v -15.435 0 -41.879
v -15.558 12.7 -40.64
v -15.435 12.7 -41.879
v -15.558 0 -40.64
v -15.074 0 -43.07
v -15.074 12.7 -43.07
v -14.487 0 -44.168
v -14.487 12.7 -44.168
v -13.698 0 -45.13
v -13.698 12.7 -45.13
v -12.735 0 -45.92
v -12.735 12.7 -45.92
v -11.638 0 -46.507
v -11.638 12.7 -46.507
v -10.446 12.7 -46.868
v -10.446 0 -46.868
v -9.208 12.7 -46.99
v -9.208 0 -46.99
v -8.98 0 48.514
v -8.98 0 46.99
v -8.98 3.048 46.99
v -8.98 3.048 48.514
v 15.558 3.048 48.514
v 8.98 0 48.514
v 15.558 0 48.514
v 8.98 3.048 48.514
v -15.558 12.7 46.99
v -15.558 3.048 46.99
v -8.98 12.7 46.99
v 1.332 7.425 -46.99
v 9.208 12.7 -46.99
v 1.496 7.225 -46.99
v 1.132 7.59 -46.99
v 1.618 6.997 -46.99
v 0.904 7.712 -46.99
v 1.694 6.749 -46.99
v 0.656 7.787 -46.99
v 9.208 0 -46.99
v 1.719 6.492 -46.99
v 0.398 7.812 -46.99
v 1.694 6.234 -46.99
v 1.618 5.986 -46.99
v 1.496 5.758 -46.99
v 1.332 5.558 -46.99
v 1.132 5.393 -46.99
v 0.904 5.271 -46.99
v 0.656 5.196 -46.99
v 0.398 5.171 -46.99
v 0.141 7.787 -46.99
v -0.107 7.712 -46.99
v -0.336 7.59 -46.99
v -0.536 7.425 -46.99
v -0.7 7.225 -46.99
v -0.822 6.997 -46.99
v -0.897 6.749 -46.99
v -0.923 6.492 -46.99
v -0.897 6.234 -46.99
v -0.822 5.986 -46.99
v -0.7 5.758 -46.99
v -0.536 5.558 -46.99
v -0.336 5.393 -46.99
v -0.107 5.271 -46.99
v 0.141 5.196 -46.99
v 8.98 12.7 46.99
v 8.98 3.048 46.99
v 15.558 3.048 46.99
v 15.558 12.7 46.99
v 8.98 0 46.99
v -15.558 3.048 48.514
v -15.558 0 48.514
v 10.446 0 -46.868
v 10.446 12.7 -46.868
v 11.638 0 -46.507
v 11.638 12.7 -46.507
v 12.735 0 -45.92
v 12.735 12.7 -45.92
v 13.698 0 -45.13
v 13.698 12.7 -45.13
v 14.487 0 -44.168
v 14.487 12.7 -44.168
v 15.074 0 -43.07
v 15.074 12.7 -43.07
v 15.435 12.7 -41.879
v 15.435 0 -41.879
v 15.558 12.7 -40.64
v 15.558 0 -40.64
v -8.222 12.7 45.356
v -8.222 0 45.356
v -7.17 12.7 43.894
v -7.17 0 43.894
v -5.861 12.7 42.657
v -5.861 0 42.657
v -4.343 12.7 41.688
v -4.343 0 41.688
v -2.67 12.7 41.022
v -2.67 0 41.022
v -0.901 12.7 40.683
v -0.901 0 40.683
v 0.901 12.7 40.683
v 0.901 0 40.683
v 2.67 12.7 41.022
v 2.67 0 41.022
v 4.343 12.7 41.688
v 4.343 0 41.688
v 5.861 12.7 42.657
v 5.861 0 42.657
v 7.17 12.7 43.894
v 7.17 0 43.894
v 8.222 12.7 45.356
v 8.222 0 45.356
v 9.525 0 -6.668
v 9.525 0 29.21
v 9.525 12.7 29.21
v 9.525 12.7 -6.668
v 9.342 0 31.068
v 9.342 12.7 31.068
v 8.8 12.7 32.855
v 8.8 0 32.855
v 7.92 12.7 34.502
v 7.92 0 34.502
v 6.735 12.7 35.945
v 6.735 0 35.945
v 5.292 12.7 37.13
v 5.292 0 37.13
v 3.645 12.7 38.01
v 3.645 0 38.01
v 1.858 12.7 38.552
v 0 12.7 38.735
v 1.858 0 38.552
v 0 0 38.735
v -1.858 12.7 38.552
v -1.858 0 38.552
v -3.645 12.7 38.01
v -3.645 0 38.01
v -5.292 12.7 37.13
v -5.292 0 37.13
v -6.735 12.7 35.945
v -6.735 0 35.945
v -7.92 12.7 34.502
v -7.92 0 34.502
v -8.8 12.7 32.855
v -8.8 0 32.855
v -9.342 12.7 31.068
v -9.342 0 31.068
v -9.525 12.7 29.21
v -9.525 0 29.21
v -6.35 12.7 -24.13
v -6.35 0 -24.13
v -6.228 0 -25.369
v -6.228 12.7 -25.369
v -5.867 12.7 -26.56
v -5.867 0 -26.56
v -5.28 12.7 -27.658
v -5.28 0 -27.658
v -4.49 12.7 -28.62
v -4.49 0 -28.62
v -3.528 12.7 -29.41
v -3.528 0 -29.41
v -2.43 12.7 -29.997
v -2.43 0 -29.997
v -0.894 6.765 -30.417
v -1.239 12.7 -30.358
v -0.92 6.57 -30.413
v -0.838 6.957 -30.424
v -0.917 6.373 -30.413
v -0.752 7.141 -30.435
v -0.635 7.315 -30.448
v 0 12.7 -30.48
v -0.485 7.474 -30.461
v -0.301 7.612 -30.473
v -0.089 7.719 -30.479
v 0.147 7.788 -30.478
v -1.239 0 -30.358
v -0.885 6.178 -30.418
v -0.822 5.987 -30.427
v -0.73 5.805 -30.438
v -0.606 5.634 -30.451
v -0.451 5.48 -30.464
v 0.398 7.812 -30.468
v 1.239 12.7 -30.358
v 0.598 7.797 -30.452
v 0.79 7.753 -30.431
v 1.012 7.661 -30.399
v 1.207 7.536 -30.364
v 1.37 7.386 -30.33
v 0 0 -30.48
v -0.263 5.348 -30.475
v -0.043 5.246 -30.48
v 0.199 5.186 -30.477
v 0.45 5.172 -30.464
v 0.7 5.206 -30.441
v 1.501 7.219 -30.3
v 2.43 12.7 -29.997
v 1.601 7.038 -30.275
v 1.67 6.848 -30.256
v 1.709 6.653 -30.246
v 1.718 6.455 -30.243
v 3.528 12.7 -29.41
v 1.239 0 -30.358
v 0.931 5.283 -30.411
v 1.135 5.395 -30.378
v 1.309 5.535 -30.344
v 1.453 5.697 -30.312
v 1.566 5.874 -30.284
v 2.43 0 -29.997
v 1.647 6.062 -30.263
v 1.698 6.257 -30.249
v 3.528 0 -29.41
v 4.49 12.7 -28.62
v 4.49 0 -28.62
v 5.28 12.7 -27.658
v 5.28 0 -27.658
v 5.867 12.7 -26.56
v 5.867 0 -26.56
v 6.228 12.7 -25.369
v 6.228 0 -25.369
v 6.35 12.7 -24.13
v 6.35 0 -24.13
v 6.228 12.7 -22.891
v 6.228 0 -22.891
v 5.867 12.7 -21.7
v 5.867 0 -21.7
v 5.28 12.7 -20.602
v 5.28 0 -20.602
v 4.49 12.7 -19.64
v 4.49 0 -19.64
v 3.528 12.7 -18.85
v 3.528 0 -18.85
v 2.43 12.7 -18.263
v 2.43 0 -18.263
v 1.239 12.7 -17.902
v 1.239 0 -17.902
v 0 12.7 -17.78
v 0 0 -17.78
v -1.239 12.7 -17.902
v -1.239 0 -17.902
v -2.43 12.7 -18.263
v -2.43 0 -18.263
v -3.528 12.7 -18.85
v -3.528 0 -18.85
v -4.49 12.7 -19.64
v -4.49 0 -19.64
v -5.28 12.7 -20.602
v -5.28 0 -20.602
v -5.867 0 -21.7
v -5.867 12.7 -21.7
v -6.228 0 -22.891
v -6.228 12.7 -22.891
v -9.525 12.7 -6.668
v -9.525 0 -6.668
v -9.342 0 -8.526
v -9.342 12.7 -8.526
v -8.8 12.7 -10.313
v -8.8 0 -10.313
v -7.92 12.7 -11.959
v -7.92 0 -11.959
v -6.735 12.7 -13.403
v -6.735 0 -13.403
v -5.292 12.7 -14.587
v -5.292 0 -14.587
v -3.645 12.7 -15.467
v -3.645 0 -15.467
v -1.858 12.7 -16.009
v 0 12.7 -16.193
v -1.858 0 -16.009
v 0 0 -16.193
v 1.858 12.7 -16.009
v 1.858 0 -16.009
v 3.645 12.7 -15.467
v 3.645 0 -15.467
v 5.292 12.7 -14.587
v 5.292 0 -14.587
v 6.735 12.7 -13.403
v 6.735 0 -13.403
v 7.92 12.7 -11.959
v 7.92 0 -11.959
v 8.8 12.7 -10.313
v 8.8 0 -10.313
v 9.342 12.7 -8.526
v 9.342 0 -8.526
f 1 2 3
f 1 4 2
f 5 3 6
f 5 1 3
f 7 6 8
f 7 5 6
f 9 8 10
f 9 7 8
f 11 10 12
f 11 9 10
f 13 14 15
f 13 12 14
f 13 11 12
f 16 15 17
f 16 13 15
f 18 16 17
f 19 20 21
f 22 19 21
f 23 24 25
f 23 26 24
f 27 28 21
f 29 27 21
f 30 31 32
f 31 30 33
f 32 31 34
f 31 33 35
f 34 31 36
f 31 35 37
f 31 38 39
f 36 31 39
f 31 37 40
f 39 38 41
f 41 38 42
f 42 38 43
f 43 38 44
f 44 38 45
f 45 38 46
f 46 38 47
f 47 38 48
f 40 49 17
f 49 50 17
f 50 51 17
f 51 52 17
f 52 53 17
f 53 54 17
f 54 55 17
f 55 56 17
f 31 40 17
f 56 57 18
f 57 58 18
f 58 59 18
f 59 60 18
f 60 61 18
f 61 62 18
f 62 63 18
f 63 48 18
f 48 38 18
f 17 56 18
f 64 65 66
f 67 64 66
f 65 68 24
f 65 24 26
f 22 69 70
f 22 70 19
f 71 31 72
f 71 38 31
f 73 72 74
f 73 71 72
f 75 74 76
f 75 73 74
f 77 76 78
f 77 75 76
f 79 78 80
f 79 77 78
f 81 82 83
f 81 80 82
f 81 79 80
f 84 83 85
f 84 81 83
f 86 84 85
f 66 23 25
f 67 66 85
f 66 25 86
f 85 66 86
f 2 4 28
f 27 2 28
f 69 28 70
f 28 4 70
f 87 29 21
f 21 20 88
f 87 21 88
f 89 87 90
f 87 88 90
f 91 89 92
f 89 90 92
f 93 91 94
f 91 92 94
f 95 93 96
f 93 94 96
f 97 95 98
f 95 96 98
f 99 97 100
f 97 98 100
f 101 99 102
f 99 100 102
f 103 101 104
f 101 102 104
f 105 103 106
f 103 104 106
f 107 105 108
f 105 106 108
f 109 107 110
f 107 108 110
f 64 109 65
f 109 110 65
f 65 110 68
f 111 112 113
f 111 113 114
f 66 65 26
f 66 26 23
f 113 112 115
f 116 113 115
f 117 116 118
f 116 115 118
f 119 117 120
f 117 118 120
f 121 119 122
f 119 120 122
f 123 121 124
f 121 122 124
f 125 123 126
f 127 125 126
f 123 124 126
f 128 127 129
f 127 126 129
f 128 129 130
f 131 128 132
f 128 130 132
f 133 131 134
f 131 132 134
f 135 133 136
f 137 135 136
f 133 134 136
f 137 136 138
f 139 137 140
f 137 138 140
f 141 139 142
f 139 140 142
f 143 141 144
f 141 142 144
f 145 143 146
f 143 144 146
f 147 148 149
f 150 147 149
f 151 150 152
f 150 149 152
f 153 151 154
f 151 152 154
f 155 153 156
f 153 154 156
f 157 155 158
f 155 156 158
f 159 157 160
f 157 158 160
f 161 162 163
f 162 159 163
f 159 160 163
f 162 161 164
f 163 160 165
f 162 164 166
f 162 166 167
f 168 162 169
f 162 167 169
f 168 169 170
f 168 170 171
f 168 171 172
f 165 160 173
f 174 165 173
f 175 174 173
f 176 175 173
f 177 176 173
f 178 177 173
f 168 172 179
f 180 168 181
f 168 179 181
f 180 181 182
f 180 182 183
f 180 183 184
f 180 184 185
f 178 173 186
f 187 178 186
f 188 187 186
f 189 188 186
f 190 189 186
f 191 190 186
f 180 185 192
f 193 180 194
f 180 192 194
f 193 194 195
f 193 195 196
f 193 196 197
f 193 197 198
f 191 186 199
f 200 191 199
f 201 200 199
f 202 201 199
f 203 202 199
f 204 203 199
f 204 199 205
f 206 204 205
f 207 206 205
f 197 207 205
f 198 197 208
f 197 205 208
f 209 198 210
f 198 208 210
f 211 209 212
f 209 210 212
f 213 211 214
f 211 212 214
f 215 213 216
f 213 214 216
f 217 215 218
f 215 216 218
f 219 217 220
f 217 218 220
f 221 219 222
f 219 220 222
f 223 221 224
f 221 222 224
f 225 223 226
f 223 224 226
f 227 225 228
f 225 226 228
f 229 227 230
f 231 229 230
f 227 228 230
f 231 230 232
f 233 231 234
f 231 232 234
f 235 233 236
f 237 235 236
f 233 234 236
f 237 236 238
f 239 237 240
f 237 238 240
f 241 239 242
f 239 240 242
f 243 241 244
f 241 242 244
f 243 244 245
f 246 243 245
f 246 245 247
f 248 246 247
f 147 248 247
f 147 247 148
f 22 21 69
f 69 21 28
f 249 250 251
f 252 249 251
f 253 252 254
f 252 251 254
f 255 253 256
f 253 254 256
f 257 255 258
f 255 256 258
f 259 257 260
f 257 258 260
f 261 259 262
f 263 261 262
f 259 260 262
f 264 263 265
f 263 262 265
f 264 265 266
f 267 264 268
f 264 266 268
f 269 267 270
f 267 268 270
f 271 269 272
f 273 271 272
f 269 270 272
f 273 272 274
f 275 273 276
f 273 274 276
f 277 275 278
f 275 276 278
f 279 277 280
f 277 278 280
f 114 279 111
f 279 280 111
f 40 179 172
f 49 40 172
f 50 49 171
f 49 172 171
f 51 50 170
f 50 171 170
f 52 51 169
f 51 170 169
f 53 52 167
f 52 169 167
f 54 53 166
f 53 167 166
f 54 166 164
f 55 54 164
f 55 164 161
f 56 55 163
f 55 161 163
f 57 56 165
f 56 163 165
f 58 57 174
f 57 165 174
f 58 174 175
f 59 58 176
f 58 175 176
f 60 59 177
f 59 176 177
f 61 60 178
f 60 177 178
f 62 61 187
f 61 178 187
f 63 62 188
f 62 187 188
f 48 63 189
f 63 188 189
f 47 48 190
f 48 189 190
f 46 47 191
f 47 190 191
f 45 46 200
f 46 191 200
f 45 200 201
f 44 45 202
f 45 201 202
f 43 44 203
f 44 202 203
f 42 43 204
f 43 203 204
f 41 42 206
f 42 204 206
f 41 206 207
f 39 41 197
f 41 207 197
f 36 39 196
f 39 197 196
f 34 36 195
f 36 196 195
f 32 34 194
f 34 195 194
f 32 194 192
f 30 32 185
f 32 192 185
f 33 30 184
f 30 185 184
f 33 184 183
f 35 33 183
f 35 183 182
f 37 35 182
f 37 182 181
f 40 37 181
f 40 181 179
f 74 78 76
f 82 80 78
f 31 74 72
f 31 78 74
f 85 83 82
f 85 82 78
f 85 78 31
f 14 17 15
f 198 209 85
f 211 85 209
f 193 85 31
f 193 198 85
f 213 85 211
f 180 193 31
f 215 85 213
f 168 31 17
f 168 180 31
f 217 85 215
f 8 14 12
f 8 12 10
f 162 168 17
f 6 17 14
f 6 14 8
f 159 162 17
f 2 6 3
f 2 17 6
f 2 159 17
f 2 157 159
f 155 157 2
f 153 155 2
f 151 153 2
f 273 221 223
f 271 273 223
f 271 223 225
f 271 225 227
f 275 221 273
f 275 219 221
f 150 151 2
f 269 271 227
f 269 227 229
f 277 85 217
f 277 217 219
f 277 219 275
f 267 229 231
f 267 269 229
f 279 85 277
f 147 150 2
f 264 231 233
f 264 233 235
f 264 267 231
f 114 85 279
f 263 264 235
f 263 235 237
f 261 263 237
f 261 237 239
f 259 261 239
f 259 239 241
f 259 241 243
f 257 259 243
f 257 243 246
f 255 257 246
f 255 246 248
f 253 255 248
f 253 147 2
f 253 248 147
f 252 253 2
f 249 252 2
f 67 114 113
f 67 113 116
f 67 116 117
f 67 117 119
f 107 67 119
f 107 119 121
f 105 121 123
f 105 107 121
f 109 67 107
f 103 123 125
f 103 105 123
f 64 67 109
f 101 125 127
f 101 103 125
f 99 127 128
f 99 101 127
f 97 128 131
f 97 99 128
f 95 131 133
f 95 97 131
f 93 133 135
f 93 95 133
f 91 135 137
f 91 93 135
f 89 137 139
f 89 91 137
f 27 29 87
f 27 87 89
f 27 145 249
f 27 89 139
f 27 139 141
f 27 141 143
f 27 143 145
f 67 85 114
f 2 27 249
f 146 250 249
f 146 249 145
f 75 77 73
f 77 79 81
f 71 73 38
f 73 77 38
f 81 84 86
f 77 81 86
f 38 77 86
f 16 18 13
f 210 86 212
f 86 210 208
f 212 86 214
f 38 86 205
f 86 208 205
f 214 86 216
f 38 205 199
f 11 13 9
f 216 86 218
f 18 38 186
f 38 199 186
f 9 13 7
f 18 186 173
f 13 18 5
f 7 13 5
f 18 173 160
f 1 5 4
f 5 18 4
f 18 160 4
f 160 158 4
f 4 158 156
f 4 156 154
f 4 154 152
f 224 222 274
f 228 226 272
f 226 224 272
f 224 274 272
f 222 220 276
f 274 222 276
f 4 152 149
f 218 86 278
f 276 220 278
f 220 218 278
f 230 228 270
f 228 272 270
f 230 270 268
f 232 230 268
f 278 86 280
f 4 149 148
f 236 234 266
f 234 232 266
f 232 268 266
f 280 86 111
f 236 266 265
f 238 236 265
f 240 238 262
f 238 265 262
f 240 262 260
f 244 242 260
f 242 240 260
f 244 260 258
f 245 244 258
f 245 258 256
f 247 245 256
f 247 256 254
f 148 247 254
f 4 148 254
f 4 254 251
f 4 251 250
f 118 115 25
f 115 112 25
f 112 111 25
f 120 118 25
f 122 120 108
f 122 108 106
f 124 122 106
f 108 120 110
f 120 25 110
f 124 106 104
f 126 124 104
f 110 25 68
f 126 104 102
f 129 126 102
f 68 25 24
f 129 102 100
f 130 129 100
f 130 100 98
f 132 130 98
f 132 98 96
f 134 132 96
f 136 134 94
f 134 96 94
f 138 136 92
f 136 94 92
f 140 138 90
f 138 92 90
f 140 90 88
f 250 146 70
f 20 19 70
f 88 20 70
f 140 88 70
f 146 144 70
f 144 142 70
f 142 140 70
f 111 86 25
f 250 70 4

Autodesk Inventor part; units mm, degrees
ref_plane "YZ Plane" through (0, 0, 0) normal (1, 0, 0) x (0, 1, 0)
ref_plane "XZ Plane" through (0, 0, 0) normal (0, 1, 0) x (-1, 0, 0)
ref_plane "XY Plane" through (0, 0, 0) normal (0, 0, 1) x (1, 0, 0)
sketch "Sketch1" plane through (0, 0, 0) normal (0, 1, 0) x (-1, 0, 0)
  line L0 (-9.2075, -46.99) -> (9.2075, -46.99)
  line L1 (15.5575, -40.64) -> (15.5575, 46.99)
  line L2 (-15.5575, 46.99) -> (-15.5575, -40.64)
  line L3 (-15.5575, -46.99) -> (15.5575, 46.99) construction
  line L4 (15.5575, -46.99) -> (-15.5575, 46.99) construction
  circle A0 centre (0, -24.13) radius 6.35
  line L5 (9.525, -6.6675) -> (9.525, 29.21)
  line L6 (-9.525, 29.21) -> (-9.525, -6.6675)
  line L7 (-9.525, -6.6675) -> (9.525, 29.21) construction
  line L8 (9.525, -6.6675) -> (-9.525, 29.21) construction
  arc A1 (9.525, 29.21) -> (-9.525, 29.21) centre (0, 29.21) ccw
  arc A2 (-9.525, -6.6675) -> (9.525, -6.6675) centre (0, -6.6675) ccw
  line L9 (-8.89, 46.99) -> (-15.5575, 46.99)
  arc A3 (9.2075, -46.99) -> (15.5575, -40.64) centre (9.2075, -40.64) ccw
  arc A4 (-15.5575, -40.64) -> (-9.2075, -46.99) centre (-9.2075, -40.64) ccw
  line L10 (0, 71.5612) -> (0, -73.6541)
  arc A5 (-8.9803, 46.99) -> (8.9803, 46.99) centre (0, 50.165) ccw
  line L11 (15.5575, 46.99) -> (8.9803, 46.99)
  line L12 (-8.9803, 46.99) -> (-15.5575, 46.99)
  point P0 (0, 0)
  point P1 (0, 11.2712)
  point P2 (0, 0)
  point P3 (0, 11.2712)
  dimension "d0" = 93.98
  dimension "d1" = 31.115
  dimension "d2" = 22.86
  dimension "d3" = 12.7
  dimension "d4" = 35.8775
  dimension "d5" = 19.05
  dimension "d7" = 6.35
  dimension "d12" = 19.05
  dimension "d13" = 17.78
  dimension "d14" = 3.175
extrude "Extrusion1" add sketch "Sketch1" along normal blind 12.7 contours A4 L2 L9 A5 L10 A1 L6 A2 A0 L0 | L10 A0 A2 L5 A1 A5 L11 L1 A3 L0
sketch "Sketch3" plane through (8.9803, 0, 46.99) normal (0, 0, 1) x (1, 0, 0)
  line L0 (-24.5378, 0) -> (-17.9605, 0)
  line L1 (-17.9605, 0) -> (-17.9605, 3.048)
  line L2 (-17.9605, 3.048) -> (-24.5378, 3.048)
  line L3 (-24.5378, 3.048) -> (-24.5378, 0)
  line L4 (6.5772, 0) -> (0, 0)
  line L5 (0, 0) -> (0, 3.048)
  line L6 (0, 3.048) -> (6.5772, 3.048)
  line L7 (6.5772, 3.048) -> (6.5772, 0)
  point P0 (-8.9803, 0)
  point P1 (0, 12.7)
  point P2 (-17.9605, 12.7)
  dimension "d15" = 3.048
extrude "Extrusion2" add sketch "Sketch3" along normal blind 1.524
hole "Hole1" at (0.3982, 6.4915, -46.99) direction (0, 0, 1) diameter 2.6416 depth 17.78 tip angle 118 thread size "6-32 UNC" class "2B" standard "ANSI Unified Screw Threads"
equation "\"d12\" = d5"
properties part number "Fixture_Slide_Lock_Plate"
